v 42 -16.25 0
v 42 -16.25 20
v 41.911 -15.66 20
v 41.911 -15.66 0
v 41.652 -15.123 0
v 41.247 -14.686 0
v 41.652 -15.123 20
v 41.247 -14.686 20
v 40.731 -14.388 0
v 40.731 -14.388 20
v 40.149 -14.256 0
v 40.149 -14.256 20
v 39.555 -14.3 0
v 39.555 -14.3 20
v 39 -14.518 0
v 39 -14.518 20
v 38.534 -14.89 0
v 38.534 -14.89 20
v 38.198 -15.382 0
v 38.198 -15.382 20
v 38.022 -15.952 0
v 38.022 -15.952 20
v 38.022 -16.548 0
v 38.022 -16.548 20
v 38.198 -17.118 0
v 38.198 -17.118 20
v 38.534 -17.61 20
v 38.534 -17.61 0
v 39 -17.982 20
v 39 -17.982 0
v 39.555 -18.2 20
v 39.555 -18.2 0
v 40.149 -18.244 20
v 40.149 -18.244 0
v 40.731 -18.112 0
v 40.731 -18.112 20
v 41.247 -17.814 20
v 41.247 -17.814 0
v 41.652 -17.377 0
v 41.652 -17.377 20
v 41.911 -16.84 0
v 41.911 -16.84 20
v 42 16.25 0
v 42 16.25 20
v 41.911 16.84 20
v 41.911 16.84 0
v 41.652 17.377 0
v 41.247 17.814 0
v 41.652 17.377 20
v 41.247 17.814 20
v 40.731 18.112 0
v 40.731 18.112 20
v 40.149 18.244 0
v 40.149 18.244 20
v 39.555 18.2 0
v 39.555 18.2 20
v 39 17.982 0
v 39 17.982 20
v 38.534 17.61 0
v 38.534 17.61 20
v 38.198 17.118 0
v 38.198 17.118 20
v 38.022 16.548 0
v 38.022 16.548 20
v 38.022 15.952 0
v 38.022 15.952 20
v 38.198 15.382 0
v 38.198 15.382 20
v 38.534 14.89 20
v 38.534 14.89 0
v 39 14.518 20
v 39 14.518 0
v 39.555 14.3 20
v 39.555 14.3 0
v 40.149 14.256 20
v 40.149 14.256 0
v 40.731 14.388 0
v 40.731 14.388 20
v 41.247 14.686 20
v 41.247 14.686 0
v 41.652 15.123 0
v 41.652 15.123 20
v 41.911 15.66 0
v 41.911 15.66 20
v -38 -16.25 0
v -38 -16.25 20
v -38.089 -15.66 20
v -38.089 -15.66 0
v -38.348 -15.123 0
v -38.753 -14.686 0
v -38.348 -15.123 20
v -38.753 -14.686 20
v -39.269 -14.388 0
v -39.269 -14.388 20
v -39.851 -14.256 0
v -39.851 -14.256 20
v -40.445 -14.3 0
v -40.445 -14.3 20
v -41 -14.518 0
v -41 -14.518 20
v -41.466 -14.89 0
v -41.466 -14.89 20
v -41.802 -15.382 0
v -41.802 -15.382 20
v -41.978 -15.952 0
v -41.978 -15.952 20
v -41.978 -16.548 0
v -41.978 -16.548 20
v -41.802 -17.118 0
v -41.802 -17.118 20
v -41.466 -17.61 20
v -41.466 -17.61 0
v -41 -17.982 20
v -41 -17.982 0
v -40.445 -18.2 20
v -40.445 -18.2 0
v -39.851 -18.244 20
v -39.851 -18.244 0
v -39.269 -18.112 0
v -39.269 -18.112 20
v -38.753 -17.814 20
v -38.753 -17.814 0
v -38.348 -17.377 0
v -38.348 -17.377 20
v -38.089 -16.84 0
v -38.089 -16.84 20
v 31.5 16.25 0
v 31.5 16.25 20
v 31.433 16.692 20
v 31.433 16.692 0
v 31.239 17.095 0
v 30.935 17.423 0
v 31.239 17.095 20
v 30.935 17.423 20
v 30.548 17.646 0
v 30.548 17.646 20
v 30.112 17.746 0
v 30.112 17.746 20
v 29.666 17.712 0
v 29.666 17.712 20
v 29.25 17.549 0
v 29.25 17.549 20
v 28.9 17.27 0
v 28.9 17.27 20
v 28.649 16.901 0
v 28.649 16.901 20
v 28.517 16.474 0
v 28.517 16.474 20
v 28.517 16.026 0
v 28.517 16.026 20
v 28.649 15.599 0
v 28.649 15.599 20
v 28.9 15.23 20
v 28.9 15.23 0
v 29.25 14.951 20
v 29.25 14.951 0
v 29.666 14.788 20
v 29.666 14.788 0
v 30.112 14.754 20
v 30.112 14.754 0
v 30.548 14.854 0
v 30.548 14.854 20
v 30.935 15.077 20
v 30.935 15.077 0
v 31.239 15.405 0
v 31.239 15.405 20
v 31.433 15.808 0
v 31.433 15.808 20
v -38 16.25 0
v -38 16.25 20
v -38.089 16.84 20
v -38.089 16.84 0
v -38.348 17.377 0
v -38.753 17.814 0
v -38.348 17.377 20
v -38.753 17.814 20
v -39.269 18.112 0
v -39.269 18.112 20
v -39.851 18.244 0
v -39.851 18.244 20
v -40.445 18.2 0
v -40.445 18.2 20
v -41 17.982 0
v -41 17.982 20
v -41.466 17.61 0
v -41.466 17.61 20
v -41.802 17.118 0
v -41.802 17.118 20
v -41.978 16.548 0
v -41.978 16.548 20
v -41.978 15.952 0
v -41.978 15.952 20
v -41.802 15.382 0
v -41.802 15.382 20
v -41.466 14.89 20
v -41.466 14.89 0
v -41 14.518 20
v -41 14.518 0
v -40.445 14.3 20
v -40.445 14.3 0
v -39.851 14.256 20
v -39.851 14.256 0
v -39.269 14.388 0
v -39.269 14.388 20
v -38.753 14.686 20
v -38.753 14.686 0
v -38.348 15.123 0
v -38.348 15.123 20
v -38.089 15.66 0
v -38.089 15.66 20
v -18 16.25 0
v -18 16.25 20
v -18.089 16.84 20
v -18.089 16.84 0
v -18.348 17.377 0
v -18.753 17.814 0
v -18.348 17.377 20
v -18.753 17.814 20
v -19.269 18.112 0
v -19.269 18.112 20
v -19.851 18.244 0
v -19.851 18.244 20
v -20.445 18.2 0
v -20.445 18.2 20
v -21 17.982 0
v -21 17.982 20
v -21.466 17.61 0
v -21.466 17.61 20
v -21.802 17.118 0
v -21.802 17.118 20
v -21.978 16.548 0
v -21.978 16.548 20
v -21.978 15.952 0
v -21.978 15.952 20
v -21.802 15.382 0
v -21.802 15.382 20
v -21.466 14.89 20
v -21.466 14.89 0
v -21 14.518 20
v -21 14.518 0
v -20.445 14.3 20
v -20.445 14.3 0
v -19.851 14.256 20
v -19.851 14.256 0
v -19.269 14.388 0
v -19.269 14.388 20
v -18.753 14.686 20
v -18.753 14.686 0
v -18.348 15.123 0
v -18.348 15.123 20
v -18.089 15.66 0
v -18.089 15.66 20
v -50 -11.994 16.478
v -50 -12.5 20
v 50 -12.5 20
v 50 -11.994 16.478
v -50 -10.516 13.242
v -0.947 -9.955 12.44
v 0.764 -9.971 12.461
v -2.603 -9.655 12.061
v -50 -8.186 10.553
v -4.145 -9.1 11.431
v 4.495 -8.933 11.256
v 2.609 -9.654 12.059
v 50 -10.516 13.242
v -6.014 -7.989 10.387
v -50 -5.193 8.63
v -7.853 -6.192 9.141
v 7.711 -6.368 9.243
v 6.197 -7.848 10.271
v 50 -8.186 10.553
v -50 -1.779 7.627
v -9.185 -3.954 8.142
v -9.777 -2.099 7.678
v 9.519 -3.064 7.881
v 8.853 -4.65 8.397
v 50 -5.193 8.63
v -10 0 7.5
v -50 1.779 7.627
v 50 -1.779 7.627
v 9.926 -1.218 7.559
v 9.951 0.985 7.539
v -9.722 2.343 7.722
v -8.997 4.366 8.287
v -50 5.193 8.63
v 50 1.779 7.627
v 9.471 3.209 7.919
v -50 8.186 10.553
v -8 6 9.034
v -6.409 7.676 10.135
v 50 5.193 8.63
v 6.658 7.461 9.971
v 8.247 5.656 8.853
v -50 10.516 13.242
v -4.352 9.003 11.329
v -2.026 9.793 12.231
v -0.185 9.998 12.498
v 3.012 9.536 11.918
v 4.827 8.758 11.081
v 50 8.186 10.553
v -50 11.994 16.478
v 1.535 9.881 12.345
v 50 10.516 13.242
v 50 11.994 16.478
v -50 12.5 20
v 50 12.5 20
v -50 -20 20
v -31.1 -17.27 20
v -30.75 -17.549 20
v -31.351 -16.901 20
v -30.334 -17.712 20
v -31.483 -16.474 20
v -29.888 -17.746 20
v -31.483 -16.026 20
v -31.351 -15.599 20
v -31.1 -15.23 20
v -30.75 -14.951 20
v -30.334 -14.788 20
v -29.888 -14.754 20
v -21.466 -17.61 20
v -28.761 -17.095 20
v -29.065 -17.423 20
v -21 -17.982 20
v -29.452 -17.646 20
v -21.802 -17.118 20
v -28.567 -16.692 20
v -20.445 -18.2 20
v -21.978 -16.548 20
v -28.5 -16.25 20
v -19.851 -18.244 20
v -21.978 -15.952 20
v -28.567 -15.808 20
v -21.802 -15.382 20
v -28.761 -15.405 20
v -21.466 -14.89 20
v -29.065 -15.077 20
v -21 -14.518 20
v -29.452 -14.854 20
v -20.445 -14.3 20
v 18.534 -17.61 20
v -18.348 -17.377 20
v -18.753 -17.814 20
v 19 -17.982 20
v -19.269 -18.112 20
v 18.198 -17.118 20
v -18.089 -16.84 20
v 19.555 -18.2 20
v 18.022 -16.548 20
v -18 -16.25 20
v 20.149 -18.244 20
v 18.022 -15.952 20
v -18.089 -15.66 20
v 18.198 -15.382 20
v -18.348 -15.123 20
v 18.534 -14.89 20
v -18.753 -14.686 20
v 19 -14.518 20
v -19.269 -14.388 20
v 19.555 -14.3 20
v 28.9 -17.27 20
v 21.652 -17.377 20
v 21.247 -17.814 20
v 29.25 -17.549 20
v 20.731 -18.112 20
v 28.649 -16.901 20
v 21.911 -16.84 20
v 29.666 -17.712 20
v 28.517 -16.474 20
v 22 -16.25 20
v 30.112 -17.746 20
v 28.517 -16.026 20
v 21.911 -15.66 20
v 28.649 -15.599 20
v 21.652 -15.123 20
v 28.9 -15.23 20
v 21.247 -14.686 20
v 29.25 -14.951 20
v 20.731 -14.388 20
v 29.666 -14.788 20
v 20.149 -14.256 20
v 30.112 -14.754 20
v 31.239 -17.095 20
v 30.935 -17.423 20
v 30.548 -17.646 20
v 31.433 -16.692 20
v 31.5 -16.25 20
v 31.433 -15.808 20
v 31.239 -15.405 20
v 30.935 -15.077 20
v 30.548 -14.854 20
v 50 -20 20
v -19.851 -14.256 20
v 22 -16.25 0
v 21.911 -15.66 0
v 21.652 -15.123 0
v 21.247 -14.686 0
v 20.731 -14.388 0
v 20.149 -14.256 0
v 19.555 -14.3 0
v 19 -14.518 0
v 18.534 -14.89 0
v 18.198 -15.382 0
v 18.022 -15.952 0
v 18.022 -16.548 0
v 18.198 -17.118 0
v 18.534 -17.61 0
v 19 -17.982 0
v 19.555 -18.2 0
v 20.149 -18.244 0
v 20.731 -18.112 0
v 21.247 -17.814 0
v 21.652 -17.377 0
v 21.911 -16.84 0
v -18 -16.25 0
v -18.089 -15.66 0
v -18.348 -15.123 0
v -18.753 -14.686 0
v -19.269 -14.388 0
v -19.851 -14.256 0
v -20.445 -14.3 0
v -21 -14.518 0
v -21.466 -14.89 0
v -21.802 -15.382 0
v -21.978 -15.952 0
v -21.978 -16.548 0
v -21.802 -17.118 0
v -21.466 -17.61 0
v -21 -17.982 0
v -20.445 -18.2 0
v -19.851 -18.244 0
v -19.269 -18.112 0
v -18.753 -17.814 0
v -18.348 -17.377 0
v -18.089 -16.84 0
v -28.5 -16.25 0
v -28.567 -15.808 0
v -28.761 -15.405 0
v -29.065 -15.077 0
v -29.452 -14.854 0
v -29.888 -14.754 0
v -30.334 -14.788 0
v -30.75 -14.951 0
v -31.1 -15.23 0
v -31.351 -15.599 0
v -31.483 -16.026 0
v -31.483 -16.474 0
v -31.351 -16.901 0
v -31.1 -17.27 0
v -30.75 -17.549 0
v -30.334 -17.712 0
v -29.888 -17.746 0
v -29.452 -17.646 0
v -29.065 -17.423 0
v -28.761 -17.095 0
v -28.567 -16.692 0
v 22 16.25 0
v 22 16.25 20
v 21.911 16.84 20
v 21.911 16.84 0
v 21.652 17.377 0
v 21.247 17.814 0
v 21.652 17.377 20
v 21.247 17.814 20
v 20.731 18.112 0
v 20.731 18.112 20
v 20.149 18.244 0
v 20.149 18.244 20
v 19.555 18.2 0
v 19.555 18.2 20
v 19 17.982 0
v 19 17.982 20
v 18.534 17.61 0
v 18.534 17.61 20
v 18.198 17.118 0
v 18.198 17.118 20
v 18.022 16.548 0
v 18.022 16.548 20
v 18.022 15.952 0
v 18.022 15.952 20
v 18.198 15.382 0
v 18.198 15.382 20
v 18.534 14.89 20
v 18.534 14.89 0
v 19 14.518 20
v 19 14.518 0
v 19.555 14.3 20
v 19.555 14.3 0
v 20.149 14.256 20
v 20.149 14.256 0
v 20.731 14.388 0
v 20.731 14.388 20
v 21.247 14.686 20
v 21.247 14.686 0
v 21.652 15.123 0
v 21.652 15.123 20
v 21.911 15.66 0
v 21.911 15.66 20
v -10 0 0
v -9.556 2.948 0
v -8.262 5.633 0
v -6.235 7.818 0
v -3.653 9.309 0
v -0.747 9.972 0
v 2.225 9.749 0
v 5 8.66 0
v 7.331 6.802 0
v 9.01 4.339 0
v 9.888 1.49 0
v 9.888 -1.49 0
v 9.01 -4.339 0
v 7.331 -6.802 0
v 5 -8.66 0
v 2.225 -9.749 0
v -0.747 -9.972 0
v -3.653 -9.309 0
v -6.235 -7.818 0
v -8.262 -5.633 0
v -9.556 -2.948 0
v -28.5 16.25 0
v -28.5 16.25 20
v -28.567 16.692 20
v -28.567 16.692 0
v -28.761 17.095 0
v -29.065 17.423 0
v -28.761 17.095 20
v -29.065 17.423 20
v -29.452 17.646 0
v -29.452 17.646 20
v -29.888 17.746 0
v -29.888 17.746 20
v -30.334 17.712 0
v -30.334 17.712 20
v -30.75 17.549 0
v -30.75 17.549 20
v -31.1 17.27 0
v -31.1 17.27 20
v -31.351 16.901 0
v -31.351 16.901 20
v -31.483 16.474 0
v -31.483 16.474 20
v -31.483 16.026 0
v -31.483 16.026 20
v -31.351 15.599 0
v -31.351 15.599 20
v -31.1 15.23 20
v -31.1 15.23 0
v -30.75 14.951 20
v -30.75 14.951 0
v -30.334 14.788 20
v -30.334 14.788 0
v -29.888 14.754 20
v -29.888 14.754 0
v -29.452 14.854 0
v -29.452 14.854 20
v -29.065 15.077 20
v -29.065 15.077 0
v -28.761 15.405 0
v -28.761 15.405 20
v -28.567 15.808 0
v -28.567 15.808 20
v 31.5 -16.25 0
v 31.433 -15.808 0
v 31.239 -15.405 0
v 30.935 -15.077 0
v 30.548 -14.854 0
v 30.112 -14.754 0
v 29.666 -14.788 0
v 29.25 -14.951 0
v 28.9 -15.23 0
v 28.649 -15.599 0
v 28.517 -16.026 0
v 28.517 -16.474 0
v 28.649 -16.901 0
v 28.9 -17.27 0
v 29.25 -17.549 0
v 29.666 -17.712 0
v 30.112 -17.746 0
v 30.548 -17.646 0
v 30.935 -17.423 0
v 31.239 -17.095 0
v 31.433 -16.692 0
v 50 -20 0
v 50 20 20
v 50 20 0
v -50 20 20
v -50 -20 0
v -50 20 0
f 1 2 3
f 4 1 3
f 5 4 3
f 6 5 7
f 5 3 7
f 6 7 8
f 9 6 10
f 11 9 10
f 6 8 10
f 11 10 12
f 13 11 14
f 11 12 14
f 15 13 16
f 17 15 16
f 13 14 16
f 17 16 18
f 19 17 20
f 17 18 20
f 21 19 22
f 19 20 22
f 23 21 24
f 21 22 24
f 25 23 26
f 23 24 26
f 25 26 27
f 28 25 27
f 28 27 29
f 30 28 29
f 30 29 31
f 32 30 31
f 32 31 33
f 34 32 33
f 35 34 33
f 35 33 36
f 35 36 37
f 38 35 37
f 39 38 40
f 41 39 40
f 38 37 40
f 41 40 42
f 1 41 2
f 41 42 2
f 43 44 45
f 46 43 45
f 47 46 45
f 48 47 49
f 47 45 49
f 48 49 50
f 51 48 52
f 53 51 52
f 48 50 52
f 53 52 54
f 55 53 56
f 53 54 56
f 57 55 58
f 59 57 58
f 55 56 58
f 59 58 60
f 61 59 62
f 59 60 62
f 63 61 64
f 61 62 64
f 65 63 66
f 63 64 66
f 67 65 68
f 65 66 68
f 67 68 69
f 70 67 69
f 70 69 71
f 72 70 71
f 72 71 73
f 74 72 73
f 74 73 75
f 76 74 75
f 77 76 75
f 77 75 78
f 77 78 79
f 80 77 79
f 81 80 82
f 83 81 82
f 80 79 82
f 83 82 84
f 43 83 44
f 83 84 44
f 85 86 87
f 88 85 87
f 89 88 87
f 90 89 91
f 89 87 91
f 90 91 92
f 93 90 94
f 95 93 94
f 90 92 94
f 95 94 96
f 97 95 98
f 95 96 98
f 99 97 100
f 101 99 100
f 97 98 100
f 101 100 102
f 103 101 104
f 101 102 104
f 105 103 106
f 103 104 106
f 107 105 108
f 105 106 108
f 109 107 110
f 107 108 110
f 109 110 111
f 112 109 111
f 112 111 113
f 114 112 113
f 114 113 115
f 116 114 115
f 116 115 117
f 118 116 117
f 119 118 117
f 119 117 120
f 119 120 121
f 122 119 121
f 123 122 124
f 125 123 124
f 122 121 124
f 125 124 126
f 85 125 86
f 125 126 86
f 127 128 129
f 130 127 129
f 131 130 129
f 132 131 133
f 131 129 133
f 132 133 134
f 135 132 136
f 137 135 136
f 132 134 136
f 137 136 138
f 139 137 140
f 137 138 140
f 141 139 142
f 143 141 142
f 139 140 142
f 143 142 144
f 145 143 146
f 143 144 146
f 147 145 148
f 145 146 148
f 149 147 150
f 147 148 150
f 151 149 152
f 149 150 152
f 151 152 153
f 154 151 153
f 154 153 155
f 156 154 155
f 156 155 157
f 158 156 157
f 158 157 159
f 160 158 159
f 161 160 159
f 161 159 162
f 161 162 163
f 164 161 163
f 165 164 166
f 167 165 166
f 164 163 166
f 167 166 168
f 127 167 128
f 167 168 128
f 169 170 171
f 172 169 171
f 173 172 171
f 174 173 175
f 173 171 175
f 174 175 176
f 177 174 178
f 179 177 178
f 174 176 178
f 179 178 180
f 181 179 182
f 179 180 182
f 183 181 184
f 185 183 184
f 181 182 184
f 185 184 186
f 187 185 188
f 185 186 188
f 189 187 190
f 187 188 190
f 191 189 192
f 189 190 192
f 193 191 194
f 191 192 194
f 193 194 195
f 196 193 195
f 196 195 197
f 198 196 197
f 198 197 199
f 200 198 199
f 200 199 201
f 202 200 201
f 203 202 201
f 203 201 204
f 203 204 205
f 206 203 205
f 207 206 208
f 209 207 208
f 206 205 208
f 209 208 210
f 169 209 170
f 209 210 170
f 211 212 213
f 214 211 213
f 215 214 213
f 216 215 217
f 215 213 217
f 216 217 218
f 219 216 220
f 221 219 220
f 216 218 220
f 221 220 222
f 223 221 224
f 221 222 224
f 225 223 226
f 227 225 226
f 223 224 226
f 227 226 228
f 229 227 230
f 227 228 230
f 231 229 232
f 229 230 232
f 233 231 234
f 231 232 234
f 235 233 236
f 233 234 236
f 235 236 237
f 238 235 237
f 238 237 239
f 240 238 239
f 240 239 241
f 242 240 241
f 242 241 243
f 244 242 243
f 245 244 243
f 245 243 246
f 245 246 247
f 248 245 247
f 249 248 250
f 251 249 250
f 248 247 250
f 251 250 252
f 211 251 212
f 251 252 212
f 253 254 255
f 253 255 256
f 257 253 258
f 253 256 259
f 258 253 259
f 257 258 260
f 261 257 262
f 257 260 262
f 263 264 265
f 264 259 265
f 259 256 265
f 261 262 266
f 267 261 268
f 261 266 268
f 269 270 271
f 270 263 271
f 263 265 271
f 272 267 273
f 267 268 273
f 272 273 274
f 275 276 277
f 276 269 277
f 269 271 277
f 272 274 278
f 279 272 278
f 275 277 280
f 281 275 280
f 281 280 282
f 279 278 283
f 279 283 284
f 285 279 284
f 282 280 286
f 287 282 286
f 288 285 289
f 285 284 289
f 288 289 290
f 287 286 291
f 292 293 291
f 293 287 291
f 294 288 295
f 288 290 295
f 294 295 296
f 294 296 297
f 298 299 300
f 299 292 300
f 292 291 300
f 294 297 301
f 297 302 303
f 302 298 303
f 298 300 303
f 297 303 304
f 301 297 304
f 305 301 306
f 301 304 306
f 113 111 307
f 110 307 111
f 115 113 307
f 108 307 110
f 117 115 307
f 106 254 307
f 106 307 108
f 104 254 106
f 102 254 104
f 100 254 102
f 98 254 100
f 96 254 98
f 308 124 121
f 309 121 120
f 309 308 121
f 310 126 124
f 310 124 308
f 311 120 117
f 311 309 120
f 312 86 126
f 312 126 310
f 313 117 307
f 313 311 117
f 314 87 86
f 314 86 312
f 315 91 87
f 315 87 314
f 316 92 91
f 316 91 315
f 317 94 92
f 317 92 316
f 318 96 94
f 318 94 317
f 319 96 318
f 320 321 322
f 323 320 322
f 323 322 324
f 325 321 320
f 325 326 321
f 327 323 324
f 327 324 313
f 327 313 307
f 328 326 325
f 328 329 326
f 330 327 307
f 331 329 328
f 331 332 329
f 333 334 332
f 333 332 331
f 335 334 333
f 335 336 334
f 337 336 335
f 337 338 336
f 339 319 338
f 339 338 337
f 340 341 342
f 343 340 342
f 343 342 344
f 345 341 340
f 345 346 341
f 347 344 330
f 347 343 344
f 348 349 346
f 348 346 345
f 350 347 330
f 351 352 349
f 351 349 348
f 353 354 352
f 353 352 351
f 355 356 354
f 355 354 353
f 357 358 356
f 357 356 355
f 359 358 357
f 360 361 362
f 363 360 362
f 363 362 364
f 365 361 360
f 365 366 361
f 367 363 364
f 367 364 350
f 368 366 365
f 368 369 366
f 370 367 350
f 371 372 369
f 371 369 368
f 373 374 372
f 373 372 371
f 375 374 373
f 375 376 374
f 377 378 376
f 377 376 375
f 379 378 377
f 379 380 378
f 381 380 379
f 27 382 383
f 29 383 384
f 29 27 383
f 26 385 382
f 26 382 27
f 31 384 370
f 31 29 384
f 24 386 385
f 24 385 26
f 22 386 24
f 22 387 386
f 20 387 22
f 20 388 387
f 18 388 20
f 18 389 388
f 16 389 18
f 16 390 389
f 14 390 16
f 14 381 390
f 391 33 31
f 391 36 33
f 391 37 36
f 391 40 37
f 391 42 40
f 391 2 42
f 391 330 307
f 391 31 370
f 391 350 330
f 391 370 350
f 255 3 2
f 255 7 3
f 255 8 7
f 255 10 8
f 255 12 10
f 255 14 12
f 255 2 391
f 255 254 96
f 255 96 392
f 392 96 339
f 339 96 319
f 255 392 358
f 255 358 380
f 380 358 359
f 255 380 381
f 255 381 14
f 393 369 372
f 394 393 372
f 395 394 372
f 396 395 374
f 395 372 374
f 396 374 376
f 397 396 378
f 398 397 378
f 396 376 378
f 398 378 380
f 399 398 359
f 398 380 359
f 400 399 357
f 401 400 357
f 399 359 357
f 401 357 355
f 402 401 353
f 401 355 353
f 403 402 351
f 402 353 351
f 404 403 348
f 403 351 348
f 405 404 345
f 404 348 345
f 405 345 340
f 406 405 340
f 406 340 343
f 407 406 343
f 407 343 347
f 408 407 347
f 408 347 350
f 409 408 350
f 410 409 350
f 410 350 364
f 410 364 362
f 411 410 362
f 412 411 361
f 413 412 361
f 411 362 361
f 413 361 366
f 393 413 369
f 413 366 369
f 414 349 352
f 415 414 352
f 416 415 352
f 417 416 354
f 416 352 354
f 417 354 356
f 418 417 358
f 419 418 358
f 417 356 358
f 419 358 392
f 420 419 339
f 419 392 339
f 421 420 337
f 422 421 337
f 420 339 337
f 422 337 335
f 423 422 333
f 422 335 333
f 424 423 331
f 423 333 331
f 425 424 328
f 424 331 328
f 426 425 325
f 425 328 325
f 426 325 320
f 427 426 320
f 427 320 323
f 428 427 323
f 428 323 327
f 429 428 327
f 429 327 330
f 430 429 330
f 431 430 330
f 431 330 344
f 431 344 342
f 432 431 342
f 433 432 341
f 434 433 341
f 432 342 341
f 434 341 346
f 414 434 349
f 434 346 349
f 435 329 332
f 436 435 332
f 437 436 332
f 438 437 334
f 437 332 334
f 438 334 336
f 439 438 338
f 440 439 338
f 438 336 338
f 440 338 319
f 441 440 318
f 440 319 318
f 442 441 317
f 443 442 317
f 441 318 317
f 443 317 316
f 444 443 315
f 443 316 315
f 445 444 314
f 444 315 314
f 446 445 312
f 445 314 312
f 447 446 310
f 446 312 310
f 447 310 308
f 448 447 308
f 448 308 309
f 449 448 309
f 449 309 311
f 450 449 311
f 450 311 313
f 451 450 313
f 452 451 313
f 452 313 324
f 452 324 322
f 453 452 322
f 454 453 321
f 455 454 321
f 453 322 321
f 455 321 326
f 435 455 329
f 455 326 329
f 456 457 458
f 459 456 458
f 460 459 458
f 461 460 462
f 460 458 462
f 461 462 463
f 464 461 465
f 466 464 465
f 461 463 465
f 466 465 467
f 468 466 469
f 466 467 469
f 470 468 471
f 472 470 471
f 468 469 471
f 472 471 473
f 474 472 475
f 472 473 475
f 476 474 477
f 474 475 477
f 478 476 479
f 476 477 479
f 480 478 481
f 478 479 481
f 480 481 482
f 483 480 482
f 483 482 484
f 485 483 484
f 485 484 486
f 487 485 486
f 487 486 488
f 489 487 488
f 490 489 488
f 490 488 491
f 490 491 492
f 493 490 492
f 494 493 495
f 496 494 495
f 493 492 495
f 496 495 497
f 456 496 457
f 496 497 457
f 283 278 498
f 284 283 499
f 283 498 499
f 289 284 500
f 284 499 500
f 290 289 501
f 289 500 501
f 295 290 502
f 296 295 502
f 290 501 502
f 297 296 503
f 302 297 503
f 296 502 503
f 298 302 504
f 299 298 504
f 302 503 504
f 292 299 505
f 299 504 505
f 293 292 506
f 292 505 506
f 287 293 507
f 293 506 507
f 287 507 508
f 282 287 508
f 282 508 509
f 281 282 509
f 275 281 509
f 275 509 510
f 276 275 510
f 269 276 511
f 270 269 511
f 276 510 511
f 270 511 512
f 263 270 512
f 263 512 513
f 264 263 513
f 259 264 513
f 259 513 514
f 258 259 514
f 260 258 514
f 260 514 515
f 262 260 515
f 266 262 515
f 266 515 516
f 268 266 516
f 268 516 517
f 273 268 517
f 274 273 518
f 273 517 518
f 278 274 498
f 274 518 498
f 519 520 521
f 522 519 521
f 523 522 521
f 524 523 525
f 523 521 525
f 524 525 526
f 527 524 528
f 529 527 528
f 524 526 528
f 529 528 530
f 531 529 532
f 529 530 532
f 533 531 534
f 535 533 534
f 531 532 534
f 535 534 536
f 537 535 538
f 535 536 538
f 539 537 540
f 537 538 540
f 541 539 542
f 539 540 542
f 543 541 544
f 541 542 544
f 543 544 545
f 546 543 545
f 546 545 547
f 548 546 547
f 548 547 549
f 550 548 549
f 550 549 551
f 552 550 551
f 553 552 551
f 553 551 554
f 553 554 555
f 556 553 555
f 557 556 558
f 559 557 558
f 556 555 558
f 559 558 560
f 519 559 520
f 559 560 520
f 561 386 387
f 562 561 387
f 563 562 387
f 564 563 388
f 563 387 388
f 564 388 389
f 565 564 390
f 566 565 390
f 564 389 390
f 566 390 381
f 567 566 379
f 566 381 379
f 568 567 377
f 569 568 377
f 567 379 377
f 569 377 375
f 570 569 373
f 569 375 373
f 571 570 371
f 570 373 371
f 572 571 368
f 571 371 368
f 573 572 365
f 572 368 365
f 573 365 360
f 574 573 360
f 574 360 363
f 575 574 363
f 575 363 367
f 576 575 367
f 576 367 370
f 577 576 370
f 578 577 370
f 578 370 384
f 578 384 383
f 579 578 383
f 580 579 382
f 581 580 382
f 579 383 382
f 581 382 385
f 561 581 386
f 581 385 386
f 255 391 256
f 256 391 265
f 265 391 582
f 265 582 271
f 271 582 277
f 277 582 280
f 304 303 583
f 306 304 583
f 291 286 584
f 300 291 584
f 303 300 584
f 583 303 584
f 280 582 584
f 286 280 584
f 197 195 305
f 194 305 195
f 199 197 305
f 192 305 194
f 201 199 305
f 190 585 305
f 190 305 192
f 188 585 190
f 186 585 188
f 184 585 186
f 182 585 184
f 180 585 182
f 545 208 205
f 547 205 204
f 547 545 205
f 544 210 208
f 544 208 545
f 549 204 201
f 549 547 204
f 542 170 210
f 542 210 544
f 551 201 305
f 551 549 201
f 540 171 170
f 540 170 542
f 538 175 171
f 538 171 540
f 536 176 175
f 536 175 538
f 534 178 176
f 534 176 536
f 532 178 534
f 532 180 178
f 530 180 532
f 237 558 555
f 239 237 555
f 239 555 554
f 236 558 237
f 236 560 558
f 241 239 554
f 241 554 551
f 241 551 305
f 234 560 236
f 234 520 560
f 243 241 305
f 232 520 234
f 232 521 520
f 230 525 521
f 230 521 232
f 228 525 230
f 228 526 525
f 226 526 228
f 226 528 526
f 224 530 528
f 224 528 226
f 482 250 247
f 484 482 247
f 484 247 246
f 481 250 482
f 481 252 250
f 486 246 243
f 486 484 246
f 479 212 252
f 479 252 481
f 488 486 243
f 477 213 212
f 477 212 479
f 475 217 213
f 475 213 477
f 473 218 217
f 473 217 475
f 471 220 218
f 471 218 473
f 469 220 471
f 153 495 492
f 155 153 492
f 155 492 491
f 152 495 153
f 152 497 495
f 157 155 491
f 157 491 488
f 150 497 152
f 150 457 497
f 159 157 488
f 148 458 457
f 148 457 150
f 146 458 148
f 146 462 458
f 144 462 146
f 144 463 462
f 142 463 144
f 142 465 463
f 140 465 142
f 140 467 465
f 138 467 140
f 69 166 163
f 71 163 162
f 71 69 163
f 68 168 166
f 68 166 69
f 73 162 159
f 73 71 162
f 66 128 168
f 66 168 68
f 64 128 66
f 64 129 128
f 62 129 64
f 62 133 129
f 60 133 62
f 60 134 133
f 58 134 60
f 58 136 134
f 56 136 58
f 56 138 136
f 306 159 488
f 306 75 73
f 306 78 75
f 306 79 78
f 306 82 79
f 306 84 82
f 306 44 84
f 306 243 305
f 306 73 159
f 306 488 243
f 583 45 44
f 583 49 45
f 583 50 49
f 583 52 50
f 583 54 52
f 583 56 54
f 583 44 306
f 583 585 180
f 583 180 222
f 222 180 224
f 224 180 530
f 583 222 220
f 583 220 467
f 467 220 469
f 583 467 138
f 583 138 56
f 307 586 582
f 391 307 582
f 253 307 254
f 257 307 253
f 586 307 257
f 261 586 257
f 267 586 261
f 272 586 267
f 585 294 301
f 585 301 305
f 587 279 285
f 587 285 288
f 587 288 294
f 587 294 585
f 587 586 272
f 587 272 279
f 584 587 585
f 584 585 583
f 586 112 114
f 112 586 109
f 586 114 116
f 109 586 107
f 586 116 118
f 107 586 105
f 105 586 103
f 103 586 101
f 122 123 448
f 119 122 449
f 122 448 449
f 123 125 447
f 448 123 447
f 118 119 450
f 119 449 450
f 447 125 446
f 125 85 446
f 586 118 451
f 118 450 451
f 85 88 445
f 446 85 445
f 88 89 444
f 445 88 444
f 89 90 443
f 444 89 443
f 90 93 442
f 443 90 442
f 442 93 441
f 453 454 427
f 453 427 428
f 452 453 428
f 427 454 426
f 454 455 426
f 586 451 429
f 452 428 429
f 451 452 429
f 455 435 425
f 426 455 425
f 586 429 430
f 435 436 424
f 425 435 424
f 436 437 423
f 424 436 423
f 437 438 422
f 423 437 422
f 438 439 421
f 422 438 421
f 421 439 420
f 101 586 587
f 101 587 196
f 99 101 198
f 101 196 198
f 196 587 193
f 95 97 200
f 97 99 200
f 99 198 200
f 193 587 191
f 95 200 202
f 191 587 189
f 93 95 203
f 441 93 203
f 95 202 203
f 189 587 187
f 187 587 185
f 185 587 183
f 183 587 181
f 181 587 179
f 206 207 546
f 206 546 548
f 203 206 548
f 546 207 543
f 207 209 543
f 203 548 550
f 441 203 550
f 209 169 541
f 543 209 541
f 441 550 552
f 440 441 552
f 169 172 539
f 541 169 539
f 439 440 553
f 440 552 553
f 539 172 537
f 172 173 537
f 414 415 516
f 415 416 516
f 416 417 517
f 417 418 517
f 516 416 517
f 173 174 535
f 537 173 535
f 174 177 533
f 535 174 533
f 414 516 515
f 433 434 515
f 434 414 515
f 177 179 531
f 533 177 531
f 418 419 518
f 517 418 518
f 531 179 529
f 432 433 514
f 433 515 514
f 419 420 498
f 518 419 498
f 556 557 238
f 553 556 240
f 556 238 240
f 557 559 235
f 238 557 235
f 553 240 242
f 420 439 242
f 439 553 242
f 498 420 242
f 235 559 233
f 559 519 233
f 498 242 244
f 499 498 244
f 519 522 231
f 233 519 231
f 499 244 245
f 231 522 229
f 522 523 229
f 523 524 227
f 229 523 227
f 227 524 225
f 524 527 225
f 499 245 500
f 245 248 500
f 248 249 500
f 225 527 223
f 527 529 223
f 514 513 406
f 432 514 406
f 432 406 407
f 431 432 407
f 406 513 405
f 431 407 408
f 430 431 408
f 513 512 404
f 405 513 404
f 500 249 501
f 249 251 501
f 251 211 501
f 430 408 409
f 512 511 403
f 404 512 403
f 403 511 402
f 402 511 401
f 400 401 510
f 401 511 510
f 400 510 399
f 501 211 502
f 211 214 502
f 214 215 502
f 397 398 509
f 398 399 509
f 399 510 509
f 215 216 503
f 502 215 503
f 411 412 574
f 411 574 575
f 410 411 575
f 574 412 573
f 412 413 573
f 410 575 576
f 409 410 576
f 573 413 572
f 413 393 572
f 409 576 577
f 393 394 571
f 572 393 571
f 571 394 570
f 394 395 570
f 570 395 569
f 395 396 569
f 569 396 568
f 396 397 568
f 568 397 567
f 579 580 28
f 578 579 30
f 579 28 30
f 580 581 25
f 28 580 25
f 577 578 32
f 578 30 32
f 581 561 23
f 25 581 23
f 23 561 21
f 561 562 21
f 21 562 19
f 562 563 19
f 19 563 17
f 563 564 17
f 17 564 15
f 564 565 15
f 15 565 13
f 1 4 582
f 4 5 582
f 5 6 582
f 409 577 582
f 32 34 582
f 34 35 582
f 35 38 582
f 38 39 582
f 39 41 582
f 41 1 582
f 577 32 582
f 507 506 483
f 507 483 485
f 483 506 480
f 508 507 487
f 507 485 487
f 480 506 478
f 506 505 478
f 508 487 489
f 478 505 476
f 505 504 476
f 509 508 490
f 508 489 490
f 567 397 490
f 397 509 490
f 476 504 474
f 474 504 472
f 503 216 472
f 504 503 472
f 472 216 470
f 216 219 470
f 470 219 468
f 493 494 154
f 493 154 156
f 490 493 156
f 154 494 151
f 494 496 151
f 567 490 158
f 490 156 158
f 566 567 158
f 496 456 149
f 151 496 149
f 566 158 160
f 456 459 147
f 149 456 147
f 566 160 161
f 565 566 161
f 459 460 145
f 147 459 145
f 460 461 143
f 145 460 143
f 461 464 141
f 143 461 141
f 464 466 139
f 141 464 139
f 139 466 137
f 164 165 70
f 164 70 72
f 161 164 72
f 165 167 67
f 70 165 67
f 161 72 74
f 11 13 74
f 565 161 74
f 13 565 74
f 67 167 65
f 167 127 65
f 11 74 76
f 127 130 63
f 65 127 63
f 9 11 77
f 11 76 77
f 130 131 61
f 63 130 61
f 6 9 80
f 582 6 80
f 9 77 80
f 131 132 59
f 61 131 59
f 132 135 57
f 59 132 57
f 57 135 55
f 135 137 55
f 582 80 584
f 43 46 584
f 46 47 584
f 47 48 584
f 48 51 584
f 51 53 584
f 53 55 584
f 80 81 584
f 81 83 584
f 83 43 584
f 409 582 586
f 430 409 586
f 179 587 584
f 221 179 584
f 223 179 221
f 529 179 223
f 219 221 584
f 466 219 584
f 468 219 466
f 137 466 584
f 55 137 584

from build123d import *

# Parameters (mm, degrees)
SKETCH1_W           = 100
SKETCH1_H           = 40
BOSS_EXTRUDE2_DEPTH = 20
SKETCH3_R           = 12.5
CUT_EXTRUDE1_DEPTH  = 100
SKETCH4_R           = 2
SKETCH4_R_2         = 1.5
CUT_EXTRUDE2_DEPTH  = 20
SKETCH5_R           = 10
CUT_EXTRUDE3_DEPTH  = 20


with BuildPart() as part:
    # Sketch1 → Boss-Extrude2 (new body)
    with BuildSketch(Plane.XY):
        Rectangle(SKETCH1_W, SKETCH1_H)
    extrude(amount=BOSS_EXTRUDE2_DEPTH)

    # Sketch3 → Cut-Extrude1 (cut)
    with BuildSketch(Plane(origin=(50, 0, 0), x_dir=(0, 0, -1), z_dir=(1, 0, 0))):
        with Locations((-20, 0)):
            Circle(SKETCH3_R)
    extrude(amount=-CUT_EXTRUDE1_DEPTH, mode=Mode.SUBTRACT)

    # Sketch4 → Cut-Extrude2 (cut)
    with BuildSketch(Plane.XY.offset(20)):
        with Locations((-20, 16.25)):
            Circle(SKETCH4_R)
        with Locations((-30, 16.25)):
            Circle(SKETCH4_R_2)
        with Locations((-40, 16.25)):
            Circle(SKETCH4_R)
        with Locations((30, 16.25)):
            Circle(SKETCH4_R_2)
        with Locations((40, 16.25)):
            Circle(SKETCH4_R)
        with Locations((20, 16.25)):
            Circle(SKETCH4_R)
        with Locations((-40, -16.25)):
            Circle(SKETCH4_R)
        with Locations((-30, -16.25)):
            Circle(SKETCH4_R_2)
        with Locations((-20, -16.25)):
            Circle(SKETCH4_R)
        with Locations((20, -16.25)):
            Circle(SKETCH4_R)
        with Locations((30, -16.25)):
            Circle(SKETCH4_R_2)
        with Locations((40, -16.25)):
            Circle(SKETCH4_R)
    extrude(amount=-CUT_EXTRUDE2_DEPTH, mode=Mode.SUBTRACT)

    # Sketch5 → Cut-Extrude3 (cut)
    with BuildSketch(Plane(origin=(0, 0, 0), x_dir=(-1, 0, 0), z_dir=(0, 0, -1))):
        Circle(SKETCH5_R)
    extrude(amount=-CUT_EXTRUDE3_DEPTH, mode=Mode.SUBTRACT)


solid = part.part
